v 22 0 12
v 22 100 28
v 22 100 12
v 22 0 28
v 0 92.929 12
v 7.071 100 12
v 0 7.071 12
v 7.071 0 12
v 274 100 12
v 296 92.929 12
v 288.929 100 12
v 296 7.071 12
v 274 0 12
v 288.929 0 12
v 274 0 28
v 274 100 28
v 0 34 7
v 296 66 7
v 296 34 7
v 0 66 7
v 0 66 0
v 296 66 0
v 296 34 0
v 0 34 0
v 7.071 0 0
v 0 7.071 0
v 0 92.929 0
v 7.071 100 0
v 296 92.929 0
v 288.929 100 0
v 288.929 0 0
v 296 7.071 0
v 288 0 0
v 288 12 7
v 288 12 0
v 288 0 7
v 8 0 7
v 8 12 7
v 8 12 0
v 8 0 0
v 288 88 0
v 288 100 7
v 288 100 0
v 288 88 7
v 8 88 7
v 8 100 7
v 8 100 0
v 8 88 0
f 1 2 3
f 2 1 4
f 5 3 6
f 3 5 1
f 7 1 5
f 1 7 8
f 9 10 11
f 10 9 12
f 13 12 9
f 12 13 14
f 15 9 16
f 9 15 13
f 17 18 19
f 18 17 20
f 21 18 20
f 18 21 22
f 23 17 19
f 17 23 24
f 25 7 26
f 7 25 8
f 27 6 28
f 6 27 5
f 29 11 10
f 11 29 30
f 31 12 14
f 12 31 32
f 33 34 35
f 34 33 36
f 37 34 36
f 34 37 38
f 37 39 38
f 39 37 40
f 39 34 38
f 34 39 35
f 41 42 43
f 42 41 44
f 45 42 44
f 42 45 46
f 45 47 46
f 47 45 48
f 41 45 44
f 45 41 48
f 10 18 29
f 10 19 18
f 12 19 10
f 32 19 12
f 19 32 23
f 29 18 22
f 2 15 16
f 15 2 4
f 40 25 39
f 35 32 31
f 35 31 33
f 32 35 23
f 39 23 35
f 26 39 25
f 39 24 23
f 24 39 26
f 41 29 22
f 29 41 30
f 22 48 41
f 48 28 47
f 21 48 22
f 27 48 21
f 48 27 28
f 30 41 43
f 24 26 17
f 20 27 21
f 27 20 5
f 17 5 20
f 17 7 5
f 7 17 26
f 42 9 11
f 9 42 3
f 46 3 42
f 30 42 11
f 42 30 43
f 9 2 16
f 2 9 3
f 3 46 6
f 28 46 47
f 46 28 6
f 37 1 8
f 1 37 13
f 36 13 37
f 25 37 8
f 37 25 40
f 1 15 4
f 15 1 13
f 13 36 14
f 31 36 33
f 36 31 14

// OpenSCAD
include <../src/wardrobe.scad>;
plank_yx_middle_top();
//github_openscad -o wardrobe_1/plank_yx_middle_top.stl -D wardrobe_n=1 -D cutting_edge=0 -D break_view_length=0 wardrobe_1/plank_yx_middle_top_stl.scad
